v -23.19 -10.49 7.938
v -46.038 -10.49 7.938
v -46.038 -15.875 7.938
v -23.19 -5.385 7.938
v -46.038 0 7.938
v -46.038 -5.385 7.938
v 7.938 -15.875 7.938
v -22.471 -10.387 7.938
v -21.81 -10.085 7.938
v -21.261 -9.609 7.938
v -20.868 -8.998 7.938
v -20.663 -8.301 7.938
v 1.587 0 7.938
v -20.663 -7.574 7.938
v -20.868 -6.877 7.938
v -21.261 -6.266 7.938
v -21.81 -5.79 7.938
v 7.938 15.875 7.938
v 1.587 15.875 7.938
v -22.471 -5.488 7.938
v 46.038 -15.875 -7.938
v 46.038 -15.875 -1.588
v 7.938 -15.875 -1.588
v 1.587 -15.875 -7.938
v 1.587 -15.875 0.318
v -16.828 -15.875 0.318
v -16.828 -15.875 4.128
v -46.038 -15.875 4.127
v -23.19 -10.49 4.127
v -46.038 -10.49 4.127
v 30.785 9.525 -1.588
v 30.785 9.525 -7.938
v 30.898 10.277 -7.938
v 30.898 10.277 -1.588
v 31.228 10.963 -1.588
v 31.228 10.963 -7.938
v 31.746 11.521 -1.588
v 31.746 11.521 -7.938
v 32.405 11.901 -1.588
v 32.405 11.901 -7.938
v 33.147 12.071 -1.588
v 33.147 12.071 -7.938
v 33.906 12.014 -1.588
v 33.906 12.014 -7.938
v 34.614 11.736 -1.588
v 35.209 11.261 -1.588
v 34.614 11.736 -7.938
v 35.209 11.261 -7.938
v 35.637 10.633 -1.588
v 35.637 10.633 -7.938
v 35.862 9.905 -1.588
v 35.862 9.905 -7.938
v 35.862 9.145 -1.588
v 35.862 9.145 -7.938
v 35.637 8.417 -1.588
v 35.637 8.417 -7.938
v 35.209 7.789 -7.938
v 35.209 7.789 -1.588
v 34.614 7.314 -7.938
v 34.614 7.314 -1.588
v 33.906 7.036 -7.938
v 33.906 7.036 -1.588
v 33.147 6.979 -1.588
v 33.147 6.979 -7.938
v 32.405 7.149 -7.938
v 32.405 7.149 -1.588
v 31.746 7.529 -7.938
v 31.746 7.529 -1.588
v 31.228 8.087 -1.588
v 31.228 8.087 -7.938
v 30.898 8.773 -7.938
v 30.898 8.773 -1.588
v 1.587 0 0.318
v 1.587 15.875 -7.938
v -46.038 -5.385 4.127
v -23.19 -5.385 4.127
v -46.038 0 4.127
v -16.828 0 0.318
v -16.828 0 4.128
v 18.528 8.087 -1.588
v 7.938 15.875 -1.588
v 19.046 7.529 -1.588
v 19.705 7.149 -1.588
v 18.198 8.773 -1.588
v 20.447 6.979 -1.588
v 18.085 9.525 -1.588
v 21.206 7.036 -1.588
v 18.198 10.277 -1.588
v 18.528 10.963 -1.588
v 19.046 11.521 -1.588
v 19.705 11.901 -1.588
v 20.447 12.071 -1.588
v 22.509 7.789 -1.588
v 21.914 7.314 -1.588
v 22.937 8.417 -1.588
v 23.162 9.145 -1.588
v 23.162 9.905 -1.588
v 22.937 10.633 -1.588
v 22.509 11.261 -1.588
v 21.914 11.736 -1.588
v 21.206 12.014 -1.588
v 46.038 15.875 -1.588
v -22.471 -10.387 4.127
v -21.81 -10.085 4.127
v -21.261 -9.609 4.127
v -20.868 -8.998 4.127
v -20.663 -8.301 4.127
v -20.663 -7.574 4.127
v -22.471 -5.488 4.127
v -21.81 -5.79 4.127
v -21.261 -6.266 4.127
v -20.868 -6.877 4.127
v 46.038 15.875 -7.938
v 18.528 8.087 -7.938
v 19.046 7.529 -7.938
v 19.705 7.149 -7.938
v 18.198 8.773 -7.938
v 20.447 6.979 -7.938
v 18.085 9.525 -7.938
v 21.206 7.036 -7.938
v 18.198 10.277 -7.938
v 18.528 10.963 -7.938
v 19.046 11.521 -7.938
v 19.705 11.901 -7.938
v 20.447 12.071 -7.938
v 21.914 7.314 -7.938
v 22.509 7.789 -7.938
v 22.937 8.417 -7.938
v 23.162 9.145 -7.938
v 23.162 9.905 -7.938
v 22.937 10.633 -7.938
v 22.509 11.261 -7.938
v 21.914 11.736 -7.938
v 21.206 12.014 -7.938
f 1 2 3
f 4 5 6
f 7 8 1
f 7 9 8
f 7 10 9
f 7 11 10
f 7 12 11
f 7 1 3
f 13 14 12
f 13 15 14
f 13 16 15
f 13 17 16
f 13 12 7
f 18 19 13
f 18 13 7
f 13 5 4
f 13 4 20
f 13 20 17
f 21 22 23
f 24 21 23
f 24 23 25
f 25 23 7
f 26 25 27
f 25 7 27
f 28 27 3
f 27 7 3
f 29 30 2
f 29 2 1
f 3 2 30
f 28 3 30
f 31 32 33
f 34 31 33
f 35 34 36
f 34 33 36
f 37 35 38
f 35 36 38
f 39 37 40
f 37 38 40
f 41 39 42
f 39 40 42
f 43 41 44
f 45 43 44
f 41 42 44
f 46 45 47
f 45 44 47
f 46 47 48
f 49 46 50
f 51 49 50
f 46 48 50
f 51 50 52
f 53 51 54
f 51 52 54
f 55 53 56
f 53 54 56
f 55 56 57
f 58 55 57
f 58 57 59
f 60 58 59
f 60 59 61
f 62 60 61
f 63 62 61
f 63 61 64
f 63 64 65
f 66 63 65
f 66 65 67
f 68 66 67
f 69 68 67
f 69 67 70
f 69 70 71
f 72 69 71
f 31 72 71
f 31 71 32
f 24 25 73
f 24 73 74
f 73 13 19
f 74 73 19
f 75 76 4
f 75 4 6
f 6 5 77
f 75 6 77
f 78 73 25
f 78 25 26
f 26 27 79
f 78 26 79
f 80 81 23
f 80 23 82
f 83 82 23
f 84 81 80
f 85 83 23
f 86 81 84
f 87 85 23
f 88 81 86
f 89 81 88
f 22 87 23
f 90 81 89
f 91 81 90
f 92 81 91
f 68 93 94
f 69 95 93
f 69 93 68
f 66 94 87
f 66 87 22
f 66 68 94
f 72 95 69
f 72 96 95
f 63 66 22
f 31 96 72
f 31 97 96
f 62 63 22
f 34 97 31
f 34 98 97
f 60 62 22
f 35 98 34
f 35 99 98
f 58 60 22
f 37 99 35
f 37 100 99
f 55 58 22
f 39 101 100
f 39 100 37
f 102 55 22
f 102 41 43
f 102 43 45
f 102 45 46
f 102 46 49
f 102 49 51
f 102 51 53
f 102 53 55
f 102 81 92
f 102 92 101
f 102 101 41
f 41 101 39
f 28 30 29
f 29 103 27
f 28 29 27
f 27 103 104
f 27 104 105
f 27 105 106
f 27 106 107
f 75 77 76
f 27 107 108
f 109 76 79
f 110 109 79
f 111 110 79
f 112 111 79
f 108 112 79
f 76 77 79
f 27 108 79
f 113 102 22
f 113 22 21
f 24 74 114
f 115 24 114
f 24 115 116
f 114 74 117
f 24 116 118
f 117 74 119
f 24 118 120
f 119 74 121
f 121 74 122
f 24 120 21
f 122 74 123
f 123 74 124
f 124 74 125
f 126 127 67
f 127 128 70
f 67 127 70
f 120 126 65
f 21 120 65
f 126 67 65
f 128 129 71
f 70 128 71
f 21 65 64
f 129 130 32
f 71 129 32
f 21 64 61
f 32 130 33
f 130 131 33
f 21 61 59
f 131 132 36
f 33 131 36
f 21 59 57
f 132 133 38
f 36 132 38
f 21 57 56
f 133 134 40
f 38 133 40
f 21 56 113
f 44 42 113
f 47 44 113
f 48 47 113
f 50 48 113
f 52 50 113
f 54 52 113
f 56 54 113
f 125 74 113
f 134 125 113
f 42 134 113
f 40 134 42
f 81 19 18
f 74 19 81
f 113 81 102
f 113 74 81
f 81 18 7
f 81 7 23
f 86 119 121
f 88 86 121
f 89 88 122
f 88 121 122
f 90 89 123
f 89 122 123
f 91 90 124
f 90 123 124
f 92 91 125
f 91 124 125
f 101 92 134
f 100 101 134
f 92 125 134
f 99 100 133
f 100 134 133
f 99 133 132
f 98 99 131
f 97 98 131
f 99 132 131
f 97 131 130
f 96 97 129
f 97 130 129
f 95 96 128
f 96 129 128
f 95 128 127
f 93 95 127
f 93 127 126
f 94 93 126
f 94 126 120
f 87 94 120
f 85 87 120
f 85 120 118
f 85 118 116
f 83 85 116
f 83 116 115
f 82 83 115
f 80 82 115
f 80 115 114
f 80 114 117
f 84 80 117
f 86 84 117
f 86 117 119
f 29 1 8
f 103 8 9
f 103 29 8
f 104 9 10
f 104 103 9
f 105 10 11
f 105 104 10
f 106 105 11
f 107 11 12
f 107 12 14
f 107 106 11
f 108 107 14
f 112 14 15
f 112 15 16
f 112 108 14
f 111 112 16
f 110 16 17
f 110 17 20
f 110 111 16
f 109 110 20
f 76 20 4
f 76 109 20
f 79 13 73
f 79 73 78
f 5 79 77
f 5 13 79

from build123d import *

# Parameters (mm, degrees)
SKETCH1_W                        = 92.075
SKETCH1_H                        = 15.875
BOSS_EXTRUDE1_DEPTH              = 15.875
SKETCH2_W                        = 47.625
SKETCH2_H                        = 15.875
CUT_EXTRUDE1_DEPTH               = 52.219943931
F_10_0_1935_DIAMETER_HOLE1_D     = 5.1054
F_10_START                       = -7.9375
F_10_0_1935_DIAMETER_SLOT1_DEPTH = 15.875
CUT_EXTRUDE2_REACH               = 51.34
SKETCH7_W                        = 47.625
SKETCH7_H                        = 12.065
CUT_EXTRUDE3_REACH               = 58.485
SKETCH8_W                        = 38.1
SKETCH8_H                        = 9.525
SKETCH9_W                        = 18.415
SKETCH9_H                        = 15.875
BOSS_EXTRUDE2_DEPTH              = 3.81


# Read off the part's stored shape, not the designer's step: #10 (0.1935) Diameter Slot1
with BuildPart() as part:
    # Sketch1 → Boss-Extrude1 (new, symmetric)
    with BuildSketch(Plane(origin=(0, 0, 0), x_dir=(1, 0, 0), z_dir=(0, 1, 0))):
        Rectangle(SKETCH1_W, SKETCH1_H)
    extrude(amount=BOSS_EXTRUDE1_DEPTH, both=True)

    # Sketch2 → Cut-Extrude1 (cut, through all)
    with BuildSketch(Plane.XY.offset(7.9375)):
        with Locations((-22.225, 7.9375)):
            Rectangle(SKETCH2_W, SKETCH2_H)
    extrude(amount=-CUT_EXTRUDE1_DEPTH, mode=Mode.SUBTRACT)

    # #10 (0.1935) Diameter Hole1 (through all)
    with Locations(Plane.XY.offset(7.9375)):
        with Locations((33.3375, 9.525), (20.6375, 9.525)):
            Hole(F_10_0_1935_DIAMETER_HOLE1_D / 2)

    # #10 (0.1935) Diameter Slot1 outline → #10 (0.1935) Diameter Slot1 (cut)
    with BuildSketch(Plane.XY.offset(F_10_START)):
        with BuildLine():
            ThreePointArc((-23.1902, -10.4902), (-20.6375, -7.9375), (-23.1902, -5.3848))
            Line((-23.1902, -5.3848), (-46.0375, -5.3848))
            Line((-46.0375, -5.3848), (-46.0375, -10.4902))
            Line((-46.0375, -10.4902), (-23.1902, -10.4902))
        make_face()
    extrude(amount=F_10_0_1935_DIAMETER_SLOT1_DEPTH, mode=Mode.SUBTRACT)

    # Sketch7 → Cut-Extrude2 (cut, up to next)
    with BuildSketch(Plane(origin=(0, 0, 0), x_dir=(1, 0, 0), z_dir=(0, 1, 0)), mode=Mode.PRIVATE) as cut_extrude2_sk1:
        with Locations((-22.225, 1.905)):
            Rectangle(SKETCH7_W, SKETCH7_H)
    cut_extrude2_tool1 = extrude(cut_extrude2_sk1.sketch, amount=-CUT_EXTRUDE2_REACH, mode=Mode.PRIVATE) & part.part
    add(cut_extrude2_tool1.solids().sort_by_distance((-22.225, 0, -1.905))[0], mode=Mode.SUBTRACT)

    # Sketch8 → Cut-Extrude3 (cut, up to next)
    with BuildSketch(Plane(origin=(0, 15.875, 0), x_dir=(1, 0, 0), z_dir=(0, 1, 0)), mode=Mode.PRIVATE) as cut_extrude3_sk1:
        with Locations((26.9875, -3.175)):
            Rectangle(SKETCH8_W, SKETCH8_H)
    cut_extrude3_tool1 = extrude(cut_extrude3_sk1.sketch, amount=-CUT_EXTRUDE3_REACH, mode=Mode.PRIVATE) & part.part
    add(cut_extrude3_tool1.solids().sort_by_distance((26.9875, 15.875, 3.175))[0], mode=Mode.SUBTRACT)

    # Sketch9 → Boss-Extrude2 (add)
    with BuildSketch(Plane(origin=(0, 0, 4.1275), x_dir=(-1, 0, 0), z_dir=(0, 0, -1))):
        with Locations((7.62, -7.9375)):
            Rectangle(SKETCH9_W, SKETCH9_H)
    extrude(amount=BOSS_EXTRUDE2_DEPTH)


solid = part.part
